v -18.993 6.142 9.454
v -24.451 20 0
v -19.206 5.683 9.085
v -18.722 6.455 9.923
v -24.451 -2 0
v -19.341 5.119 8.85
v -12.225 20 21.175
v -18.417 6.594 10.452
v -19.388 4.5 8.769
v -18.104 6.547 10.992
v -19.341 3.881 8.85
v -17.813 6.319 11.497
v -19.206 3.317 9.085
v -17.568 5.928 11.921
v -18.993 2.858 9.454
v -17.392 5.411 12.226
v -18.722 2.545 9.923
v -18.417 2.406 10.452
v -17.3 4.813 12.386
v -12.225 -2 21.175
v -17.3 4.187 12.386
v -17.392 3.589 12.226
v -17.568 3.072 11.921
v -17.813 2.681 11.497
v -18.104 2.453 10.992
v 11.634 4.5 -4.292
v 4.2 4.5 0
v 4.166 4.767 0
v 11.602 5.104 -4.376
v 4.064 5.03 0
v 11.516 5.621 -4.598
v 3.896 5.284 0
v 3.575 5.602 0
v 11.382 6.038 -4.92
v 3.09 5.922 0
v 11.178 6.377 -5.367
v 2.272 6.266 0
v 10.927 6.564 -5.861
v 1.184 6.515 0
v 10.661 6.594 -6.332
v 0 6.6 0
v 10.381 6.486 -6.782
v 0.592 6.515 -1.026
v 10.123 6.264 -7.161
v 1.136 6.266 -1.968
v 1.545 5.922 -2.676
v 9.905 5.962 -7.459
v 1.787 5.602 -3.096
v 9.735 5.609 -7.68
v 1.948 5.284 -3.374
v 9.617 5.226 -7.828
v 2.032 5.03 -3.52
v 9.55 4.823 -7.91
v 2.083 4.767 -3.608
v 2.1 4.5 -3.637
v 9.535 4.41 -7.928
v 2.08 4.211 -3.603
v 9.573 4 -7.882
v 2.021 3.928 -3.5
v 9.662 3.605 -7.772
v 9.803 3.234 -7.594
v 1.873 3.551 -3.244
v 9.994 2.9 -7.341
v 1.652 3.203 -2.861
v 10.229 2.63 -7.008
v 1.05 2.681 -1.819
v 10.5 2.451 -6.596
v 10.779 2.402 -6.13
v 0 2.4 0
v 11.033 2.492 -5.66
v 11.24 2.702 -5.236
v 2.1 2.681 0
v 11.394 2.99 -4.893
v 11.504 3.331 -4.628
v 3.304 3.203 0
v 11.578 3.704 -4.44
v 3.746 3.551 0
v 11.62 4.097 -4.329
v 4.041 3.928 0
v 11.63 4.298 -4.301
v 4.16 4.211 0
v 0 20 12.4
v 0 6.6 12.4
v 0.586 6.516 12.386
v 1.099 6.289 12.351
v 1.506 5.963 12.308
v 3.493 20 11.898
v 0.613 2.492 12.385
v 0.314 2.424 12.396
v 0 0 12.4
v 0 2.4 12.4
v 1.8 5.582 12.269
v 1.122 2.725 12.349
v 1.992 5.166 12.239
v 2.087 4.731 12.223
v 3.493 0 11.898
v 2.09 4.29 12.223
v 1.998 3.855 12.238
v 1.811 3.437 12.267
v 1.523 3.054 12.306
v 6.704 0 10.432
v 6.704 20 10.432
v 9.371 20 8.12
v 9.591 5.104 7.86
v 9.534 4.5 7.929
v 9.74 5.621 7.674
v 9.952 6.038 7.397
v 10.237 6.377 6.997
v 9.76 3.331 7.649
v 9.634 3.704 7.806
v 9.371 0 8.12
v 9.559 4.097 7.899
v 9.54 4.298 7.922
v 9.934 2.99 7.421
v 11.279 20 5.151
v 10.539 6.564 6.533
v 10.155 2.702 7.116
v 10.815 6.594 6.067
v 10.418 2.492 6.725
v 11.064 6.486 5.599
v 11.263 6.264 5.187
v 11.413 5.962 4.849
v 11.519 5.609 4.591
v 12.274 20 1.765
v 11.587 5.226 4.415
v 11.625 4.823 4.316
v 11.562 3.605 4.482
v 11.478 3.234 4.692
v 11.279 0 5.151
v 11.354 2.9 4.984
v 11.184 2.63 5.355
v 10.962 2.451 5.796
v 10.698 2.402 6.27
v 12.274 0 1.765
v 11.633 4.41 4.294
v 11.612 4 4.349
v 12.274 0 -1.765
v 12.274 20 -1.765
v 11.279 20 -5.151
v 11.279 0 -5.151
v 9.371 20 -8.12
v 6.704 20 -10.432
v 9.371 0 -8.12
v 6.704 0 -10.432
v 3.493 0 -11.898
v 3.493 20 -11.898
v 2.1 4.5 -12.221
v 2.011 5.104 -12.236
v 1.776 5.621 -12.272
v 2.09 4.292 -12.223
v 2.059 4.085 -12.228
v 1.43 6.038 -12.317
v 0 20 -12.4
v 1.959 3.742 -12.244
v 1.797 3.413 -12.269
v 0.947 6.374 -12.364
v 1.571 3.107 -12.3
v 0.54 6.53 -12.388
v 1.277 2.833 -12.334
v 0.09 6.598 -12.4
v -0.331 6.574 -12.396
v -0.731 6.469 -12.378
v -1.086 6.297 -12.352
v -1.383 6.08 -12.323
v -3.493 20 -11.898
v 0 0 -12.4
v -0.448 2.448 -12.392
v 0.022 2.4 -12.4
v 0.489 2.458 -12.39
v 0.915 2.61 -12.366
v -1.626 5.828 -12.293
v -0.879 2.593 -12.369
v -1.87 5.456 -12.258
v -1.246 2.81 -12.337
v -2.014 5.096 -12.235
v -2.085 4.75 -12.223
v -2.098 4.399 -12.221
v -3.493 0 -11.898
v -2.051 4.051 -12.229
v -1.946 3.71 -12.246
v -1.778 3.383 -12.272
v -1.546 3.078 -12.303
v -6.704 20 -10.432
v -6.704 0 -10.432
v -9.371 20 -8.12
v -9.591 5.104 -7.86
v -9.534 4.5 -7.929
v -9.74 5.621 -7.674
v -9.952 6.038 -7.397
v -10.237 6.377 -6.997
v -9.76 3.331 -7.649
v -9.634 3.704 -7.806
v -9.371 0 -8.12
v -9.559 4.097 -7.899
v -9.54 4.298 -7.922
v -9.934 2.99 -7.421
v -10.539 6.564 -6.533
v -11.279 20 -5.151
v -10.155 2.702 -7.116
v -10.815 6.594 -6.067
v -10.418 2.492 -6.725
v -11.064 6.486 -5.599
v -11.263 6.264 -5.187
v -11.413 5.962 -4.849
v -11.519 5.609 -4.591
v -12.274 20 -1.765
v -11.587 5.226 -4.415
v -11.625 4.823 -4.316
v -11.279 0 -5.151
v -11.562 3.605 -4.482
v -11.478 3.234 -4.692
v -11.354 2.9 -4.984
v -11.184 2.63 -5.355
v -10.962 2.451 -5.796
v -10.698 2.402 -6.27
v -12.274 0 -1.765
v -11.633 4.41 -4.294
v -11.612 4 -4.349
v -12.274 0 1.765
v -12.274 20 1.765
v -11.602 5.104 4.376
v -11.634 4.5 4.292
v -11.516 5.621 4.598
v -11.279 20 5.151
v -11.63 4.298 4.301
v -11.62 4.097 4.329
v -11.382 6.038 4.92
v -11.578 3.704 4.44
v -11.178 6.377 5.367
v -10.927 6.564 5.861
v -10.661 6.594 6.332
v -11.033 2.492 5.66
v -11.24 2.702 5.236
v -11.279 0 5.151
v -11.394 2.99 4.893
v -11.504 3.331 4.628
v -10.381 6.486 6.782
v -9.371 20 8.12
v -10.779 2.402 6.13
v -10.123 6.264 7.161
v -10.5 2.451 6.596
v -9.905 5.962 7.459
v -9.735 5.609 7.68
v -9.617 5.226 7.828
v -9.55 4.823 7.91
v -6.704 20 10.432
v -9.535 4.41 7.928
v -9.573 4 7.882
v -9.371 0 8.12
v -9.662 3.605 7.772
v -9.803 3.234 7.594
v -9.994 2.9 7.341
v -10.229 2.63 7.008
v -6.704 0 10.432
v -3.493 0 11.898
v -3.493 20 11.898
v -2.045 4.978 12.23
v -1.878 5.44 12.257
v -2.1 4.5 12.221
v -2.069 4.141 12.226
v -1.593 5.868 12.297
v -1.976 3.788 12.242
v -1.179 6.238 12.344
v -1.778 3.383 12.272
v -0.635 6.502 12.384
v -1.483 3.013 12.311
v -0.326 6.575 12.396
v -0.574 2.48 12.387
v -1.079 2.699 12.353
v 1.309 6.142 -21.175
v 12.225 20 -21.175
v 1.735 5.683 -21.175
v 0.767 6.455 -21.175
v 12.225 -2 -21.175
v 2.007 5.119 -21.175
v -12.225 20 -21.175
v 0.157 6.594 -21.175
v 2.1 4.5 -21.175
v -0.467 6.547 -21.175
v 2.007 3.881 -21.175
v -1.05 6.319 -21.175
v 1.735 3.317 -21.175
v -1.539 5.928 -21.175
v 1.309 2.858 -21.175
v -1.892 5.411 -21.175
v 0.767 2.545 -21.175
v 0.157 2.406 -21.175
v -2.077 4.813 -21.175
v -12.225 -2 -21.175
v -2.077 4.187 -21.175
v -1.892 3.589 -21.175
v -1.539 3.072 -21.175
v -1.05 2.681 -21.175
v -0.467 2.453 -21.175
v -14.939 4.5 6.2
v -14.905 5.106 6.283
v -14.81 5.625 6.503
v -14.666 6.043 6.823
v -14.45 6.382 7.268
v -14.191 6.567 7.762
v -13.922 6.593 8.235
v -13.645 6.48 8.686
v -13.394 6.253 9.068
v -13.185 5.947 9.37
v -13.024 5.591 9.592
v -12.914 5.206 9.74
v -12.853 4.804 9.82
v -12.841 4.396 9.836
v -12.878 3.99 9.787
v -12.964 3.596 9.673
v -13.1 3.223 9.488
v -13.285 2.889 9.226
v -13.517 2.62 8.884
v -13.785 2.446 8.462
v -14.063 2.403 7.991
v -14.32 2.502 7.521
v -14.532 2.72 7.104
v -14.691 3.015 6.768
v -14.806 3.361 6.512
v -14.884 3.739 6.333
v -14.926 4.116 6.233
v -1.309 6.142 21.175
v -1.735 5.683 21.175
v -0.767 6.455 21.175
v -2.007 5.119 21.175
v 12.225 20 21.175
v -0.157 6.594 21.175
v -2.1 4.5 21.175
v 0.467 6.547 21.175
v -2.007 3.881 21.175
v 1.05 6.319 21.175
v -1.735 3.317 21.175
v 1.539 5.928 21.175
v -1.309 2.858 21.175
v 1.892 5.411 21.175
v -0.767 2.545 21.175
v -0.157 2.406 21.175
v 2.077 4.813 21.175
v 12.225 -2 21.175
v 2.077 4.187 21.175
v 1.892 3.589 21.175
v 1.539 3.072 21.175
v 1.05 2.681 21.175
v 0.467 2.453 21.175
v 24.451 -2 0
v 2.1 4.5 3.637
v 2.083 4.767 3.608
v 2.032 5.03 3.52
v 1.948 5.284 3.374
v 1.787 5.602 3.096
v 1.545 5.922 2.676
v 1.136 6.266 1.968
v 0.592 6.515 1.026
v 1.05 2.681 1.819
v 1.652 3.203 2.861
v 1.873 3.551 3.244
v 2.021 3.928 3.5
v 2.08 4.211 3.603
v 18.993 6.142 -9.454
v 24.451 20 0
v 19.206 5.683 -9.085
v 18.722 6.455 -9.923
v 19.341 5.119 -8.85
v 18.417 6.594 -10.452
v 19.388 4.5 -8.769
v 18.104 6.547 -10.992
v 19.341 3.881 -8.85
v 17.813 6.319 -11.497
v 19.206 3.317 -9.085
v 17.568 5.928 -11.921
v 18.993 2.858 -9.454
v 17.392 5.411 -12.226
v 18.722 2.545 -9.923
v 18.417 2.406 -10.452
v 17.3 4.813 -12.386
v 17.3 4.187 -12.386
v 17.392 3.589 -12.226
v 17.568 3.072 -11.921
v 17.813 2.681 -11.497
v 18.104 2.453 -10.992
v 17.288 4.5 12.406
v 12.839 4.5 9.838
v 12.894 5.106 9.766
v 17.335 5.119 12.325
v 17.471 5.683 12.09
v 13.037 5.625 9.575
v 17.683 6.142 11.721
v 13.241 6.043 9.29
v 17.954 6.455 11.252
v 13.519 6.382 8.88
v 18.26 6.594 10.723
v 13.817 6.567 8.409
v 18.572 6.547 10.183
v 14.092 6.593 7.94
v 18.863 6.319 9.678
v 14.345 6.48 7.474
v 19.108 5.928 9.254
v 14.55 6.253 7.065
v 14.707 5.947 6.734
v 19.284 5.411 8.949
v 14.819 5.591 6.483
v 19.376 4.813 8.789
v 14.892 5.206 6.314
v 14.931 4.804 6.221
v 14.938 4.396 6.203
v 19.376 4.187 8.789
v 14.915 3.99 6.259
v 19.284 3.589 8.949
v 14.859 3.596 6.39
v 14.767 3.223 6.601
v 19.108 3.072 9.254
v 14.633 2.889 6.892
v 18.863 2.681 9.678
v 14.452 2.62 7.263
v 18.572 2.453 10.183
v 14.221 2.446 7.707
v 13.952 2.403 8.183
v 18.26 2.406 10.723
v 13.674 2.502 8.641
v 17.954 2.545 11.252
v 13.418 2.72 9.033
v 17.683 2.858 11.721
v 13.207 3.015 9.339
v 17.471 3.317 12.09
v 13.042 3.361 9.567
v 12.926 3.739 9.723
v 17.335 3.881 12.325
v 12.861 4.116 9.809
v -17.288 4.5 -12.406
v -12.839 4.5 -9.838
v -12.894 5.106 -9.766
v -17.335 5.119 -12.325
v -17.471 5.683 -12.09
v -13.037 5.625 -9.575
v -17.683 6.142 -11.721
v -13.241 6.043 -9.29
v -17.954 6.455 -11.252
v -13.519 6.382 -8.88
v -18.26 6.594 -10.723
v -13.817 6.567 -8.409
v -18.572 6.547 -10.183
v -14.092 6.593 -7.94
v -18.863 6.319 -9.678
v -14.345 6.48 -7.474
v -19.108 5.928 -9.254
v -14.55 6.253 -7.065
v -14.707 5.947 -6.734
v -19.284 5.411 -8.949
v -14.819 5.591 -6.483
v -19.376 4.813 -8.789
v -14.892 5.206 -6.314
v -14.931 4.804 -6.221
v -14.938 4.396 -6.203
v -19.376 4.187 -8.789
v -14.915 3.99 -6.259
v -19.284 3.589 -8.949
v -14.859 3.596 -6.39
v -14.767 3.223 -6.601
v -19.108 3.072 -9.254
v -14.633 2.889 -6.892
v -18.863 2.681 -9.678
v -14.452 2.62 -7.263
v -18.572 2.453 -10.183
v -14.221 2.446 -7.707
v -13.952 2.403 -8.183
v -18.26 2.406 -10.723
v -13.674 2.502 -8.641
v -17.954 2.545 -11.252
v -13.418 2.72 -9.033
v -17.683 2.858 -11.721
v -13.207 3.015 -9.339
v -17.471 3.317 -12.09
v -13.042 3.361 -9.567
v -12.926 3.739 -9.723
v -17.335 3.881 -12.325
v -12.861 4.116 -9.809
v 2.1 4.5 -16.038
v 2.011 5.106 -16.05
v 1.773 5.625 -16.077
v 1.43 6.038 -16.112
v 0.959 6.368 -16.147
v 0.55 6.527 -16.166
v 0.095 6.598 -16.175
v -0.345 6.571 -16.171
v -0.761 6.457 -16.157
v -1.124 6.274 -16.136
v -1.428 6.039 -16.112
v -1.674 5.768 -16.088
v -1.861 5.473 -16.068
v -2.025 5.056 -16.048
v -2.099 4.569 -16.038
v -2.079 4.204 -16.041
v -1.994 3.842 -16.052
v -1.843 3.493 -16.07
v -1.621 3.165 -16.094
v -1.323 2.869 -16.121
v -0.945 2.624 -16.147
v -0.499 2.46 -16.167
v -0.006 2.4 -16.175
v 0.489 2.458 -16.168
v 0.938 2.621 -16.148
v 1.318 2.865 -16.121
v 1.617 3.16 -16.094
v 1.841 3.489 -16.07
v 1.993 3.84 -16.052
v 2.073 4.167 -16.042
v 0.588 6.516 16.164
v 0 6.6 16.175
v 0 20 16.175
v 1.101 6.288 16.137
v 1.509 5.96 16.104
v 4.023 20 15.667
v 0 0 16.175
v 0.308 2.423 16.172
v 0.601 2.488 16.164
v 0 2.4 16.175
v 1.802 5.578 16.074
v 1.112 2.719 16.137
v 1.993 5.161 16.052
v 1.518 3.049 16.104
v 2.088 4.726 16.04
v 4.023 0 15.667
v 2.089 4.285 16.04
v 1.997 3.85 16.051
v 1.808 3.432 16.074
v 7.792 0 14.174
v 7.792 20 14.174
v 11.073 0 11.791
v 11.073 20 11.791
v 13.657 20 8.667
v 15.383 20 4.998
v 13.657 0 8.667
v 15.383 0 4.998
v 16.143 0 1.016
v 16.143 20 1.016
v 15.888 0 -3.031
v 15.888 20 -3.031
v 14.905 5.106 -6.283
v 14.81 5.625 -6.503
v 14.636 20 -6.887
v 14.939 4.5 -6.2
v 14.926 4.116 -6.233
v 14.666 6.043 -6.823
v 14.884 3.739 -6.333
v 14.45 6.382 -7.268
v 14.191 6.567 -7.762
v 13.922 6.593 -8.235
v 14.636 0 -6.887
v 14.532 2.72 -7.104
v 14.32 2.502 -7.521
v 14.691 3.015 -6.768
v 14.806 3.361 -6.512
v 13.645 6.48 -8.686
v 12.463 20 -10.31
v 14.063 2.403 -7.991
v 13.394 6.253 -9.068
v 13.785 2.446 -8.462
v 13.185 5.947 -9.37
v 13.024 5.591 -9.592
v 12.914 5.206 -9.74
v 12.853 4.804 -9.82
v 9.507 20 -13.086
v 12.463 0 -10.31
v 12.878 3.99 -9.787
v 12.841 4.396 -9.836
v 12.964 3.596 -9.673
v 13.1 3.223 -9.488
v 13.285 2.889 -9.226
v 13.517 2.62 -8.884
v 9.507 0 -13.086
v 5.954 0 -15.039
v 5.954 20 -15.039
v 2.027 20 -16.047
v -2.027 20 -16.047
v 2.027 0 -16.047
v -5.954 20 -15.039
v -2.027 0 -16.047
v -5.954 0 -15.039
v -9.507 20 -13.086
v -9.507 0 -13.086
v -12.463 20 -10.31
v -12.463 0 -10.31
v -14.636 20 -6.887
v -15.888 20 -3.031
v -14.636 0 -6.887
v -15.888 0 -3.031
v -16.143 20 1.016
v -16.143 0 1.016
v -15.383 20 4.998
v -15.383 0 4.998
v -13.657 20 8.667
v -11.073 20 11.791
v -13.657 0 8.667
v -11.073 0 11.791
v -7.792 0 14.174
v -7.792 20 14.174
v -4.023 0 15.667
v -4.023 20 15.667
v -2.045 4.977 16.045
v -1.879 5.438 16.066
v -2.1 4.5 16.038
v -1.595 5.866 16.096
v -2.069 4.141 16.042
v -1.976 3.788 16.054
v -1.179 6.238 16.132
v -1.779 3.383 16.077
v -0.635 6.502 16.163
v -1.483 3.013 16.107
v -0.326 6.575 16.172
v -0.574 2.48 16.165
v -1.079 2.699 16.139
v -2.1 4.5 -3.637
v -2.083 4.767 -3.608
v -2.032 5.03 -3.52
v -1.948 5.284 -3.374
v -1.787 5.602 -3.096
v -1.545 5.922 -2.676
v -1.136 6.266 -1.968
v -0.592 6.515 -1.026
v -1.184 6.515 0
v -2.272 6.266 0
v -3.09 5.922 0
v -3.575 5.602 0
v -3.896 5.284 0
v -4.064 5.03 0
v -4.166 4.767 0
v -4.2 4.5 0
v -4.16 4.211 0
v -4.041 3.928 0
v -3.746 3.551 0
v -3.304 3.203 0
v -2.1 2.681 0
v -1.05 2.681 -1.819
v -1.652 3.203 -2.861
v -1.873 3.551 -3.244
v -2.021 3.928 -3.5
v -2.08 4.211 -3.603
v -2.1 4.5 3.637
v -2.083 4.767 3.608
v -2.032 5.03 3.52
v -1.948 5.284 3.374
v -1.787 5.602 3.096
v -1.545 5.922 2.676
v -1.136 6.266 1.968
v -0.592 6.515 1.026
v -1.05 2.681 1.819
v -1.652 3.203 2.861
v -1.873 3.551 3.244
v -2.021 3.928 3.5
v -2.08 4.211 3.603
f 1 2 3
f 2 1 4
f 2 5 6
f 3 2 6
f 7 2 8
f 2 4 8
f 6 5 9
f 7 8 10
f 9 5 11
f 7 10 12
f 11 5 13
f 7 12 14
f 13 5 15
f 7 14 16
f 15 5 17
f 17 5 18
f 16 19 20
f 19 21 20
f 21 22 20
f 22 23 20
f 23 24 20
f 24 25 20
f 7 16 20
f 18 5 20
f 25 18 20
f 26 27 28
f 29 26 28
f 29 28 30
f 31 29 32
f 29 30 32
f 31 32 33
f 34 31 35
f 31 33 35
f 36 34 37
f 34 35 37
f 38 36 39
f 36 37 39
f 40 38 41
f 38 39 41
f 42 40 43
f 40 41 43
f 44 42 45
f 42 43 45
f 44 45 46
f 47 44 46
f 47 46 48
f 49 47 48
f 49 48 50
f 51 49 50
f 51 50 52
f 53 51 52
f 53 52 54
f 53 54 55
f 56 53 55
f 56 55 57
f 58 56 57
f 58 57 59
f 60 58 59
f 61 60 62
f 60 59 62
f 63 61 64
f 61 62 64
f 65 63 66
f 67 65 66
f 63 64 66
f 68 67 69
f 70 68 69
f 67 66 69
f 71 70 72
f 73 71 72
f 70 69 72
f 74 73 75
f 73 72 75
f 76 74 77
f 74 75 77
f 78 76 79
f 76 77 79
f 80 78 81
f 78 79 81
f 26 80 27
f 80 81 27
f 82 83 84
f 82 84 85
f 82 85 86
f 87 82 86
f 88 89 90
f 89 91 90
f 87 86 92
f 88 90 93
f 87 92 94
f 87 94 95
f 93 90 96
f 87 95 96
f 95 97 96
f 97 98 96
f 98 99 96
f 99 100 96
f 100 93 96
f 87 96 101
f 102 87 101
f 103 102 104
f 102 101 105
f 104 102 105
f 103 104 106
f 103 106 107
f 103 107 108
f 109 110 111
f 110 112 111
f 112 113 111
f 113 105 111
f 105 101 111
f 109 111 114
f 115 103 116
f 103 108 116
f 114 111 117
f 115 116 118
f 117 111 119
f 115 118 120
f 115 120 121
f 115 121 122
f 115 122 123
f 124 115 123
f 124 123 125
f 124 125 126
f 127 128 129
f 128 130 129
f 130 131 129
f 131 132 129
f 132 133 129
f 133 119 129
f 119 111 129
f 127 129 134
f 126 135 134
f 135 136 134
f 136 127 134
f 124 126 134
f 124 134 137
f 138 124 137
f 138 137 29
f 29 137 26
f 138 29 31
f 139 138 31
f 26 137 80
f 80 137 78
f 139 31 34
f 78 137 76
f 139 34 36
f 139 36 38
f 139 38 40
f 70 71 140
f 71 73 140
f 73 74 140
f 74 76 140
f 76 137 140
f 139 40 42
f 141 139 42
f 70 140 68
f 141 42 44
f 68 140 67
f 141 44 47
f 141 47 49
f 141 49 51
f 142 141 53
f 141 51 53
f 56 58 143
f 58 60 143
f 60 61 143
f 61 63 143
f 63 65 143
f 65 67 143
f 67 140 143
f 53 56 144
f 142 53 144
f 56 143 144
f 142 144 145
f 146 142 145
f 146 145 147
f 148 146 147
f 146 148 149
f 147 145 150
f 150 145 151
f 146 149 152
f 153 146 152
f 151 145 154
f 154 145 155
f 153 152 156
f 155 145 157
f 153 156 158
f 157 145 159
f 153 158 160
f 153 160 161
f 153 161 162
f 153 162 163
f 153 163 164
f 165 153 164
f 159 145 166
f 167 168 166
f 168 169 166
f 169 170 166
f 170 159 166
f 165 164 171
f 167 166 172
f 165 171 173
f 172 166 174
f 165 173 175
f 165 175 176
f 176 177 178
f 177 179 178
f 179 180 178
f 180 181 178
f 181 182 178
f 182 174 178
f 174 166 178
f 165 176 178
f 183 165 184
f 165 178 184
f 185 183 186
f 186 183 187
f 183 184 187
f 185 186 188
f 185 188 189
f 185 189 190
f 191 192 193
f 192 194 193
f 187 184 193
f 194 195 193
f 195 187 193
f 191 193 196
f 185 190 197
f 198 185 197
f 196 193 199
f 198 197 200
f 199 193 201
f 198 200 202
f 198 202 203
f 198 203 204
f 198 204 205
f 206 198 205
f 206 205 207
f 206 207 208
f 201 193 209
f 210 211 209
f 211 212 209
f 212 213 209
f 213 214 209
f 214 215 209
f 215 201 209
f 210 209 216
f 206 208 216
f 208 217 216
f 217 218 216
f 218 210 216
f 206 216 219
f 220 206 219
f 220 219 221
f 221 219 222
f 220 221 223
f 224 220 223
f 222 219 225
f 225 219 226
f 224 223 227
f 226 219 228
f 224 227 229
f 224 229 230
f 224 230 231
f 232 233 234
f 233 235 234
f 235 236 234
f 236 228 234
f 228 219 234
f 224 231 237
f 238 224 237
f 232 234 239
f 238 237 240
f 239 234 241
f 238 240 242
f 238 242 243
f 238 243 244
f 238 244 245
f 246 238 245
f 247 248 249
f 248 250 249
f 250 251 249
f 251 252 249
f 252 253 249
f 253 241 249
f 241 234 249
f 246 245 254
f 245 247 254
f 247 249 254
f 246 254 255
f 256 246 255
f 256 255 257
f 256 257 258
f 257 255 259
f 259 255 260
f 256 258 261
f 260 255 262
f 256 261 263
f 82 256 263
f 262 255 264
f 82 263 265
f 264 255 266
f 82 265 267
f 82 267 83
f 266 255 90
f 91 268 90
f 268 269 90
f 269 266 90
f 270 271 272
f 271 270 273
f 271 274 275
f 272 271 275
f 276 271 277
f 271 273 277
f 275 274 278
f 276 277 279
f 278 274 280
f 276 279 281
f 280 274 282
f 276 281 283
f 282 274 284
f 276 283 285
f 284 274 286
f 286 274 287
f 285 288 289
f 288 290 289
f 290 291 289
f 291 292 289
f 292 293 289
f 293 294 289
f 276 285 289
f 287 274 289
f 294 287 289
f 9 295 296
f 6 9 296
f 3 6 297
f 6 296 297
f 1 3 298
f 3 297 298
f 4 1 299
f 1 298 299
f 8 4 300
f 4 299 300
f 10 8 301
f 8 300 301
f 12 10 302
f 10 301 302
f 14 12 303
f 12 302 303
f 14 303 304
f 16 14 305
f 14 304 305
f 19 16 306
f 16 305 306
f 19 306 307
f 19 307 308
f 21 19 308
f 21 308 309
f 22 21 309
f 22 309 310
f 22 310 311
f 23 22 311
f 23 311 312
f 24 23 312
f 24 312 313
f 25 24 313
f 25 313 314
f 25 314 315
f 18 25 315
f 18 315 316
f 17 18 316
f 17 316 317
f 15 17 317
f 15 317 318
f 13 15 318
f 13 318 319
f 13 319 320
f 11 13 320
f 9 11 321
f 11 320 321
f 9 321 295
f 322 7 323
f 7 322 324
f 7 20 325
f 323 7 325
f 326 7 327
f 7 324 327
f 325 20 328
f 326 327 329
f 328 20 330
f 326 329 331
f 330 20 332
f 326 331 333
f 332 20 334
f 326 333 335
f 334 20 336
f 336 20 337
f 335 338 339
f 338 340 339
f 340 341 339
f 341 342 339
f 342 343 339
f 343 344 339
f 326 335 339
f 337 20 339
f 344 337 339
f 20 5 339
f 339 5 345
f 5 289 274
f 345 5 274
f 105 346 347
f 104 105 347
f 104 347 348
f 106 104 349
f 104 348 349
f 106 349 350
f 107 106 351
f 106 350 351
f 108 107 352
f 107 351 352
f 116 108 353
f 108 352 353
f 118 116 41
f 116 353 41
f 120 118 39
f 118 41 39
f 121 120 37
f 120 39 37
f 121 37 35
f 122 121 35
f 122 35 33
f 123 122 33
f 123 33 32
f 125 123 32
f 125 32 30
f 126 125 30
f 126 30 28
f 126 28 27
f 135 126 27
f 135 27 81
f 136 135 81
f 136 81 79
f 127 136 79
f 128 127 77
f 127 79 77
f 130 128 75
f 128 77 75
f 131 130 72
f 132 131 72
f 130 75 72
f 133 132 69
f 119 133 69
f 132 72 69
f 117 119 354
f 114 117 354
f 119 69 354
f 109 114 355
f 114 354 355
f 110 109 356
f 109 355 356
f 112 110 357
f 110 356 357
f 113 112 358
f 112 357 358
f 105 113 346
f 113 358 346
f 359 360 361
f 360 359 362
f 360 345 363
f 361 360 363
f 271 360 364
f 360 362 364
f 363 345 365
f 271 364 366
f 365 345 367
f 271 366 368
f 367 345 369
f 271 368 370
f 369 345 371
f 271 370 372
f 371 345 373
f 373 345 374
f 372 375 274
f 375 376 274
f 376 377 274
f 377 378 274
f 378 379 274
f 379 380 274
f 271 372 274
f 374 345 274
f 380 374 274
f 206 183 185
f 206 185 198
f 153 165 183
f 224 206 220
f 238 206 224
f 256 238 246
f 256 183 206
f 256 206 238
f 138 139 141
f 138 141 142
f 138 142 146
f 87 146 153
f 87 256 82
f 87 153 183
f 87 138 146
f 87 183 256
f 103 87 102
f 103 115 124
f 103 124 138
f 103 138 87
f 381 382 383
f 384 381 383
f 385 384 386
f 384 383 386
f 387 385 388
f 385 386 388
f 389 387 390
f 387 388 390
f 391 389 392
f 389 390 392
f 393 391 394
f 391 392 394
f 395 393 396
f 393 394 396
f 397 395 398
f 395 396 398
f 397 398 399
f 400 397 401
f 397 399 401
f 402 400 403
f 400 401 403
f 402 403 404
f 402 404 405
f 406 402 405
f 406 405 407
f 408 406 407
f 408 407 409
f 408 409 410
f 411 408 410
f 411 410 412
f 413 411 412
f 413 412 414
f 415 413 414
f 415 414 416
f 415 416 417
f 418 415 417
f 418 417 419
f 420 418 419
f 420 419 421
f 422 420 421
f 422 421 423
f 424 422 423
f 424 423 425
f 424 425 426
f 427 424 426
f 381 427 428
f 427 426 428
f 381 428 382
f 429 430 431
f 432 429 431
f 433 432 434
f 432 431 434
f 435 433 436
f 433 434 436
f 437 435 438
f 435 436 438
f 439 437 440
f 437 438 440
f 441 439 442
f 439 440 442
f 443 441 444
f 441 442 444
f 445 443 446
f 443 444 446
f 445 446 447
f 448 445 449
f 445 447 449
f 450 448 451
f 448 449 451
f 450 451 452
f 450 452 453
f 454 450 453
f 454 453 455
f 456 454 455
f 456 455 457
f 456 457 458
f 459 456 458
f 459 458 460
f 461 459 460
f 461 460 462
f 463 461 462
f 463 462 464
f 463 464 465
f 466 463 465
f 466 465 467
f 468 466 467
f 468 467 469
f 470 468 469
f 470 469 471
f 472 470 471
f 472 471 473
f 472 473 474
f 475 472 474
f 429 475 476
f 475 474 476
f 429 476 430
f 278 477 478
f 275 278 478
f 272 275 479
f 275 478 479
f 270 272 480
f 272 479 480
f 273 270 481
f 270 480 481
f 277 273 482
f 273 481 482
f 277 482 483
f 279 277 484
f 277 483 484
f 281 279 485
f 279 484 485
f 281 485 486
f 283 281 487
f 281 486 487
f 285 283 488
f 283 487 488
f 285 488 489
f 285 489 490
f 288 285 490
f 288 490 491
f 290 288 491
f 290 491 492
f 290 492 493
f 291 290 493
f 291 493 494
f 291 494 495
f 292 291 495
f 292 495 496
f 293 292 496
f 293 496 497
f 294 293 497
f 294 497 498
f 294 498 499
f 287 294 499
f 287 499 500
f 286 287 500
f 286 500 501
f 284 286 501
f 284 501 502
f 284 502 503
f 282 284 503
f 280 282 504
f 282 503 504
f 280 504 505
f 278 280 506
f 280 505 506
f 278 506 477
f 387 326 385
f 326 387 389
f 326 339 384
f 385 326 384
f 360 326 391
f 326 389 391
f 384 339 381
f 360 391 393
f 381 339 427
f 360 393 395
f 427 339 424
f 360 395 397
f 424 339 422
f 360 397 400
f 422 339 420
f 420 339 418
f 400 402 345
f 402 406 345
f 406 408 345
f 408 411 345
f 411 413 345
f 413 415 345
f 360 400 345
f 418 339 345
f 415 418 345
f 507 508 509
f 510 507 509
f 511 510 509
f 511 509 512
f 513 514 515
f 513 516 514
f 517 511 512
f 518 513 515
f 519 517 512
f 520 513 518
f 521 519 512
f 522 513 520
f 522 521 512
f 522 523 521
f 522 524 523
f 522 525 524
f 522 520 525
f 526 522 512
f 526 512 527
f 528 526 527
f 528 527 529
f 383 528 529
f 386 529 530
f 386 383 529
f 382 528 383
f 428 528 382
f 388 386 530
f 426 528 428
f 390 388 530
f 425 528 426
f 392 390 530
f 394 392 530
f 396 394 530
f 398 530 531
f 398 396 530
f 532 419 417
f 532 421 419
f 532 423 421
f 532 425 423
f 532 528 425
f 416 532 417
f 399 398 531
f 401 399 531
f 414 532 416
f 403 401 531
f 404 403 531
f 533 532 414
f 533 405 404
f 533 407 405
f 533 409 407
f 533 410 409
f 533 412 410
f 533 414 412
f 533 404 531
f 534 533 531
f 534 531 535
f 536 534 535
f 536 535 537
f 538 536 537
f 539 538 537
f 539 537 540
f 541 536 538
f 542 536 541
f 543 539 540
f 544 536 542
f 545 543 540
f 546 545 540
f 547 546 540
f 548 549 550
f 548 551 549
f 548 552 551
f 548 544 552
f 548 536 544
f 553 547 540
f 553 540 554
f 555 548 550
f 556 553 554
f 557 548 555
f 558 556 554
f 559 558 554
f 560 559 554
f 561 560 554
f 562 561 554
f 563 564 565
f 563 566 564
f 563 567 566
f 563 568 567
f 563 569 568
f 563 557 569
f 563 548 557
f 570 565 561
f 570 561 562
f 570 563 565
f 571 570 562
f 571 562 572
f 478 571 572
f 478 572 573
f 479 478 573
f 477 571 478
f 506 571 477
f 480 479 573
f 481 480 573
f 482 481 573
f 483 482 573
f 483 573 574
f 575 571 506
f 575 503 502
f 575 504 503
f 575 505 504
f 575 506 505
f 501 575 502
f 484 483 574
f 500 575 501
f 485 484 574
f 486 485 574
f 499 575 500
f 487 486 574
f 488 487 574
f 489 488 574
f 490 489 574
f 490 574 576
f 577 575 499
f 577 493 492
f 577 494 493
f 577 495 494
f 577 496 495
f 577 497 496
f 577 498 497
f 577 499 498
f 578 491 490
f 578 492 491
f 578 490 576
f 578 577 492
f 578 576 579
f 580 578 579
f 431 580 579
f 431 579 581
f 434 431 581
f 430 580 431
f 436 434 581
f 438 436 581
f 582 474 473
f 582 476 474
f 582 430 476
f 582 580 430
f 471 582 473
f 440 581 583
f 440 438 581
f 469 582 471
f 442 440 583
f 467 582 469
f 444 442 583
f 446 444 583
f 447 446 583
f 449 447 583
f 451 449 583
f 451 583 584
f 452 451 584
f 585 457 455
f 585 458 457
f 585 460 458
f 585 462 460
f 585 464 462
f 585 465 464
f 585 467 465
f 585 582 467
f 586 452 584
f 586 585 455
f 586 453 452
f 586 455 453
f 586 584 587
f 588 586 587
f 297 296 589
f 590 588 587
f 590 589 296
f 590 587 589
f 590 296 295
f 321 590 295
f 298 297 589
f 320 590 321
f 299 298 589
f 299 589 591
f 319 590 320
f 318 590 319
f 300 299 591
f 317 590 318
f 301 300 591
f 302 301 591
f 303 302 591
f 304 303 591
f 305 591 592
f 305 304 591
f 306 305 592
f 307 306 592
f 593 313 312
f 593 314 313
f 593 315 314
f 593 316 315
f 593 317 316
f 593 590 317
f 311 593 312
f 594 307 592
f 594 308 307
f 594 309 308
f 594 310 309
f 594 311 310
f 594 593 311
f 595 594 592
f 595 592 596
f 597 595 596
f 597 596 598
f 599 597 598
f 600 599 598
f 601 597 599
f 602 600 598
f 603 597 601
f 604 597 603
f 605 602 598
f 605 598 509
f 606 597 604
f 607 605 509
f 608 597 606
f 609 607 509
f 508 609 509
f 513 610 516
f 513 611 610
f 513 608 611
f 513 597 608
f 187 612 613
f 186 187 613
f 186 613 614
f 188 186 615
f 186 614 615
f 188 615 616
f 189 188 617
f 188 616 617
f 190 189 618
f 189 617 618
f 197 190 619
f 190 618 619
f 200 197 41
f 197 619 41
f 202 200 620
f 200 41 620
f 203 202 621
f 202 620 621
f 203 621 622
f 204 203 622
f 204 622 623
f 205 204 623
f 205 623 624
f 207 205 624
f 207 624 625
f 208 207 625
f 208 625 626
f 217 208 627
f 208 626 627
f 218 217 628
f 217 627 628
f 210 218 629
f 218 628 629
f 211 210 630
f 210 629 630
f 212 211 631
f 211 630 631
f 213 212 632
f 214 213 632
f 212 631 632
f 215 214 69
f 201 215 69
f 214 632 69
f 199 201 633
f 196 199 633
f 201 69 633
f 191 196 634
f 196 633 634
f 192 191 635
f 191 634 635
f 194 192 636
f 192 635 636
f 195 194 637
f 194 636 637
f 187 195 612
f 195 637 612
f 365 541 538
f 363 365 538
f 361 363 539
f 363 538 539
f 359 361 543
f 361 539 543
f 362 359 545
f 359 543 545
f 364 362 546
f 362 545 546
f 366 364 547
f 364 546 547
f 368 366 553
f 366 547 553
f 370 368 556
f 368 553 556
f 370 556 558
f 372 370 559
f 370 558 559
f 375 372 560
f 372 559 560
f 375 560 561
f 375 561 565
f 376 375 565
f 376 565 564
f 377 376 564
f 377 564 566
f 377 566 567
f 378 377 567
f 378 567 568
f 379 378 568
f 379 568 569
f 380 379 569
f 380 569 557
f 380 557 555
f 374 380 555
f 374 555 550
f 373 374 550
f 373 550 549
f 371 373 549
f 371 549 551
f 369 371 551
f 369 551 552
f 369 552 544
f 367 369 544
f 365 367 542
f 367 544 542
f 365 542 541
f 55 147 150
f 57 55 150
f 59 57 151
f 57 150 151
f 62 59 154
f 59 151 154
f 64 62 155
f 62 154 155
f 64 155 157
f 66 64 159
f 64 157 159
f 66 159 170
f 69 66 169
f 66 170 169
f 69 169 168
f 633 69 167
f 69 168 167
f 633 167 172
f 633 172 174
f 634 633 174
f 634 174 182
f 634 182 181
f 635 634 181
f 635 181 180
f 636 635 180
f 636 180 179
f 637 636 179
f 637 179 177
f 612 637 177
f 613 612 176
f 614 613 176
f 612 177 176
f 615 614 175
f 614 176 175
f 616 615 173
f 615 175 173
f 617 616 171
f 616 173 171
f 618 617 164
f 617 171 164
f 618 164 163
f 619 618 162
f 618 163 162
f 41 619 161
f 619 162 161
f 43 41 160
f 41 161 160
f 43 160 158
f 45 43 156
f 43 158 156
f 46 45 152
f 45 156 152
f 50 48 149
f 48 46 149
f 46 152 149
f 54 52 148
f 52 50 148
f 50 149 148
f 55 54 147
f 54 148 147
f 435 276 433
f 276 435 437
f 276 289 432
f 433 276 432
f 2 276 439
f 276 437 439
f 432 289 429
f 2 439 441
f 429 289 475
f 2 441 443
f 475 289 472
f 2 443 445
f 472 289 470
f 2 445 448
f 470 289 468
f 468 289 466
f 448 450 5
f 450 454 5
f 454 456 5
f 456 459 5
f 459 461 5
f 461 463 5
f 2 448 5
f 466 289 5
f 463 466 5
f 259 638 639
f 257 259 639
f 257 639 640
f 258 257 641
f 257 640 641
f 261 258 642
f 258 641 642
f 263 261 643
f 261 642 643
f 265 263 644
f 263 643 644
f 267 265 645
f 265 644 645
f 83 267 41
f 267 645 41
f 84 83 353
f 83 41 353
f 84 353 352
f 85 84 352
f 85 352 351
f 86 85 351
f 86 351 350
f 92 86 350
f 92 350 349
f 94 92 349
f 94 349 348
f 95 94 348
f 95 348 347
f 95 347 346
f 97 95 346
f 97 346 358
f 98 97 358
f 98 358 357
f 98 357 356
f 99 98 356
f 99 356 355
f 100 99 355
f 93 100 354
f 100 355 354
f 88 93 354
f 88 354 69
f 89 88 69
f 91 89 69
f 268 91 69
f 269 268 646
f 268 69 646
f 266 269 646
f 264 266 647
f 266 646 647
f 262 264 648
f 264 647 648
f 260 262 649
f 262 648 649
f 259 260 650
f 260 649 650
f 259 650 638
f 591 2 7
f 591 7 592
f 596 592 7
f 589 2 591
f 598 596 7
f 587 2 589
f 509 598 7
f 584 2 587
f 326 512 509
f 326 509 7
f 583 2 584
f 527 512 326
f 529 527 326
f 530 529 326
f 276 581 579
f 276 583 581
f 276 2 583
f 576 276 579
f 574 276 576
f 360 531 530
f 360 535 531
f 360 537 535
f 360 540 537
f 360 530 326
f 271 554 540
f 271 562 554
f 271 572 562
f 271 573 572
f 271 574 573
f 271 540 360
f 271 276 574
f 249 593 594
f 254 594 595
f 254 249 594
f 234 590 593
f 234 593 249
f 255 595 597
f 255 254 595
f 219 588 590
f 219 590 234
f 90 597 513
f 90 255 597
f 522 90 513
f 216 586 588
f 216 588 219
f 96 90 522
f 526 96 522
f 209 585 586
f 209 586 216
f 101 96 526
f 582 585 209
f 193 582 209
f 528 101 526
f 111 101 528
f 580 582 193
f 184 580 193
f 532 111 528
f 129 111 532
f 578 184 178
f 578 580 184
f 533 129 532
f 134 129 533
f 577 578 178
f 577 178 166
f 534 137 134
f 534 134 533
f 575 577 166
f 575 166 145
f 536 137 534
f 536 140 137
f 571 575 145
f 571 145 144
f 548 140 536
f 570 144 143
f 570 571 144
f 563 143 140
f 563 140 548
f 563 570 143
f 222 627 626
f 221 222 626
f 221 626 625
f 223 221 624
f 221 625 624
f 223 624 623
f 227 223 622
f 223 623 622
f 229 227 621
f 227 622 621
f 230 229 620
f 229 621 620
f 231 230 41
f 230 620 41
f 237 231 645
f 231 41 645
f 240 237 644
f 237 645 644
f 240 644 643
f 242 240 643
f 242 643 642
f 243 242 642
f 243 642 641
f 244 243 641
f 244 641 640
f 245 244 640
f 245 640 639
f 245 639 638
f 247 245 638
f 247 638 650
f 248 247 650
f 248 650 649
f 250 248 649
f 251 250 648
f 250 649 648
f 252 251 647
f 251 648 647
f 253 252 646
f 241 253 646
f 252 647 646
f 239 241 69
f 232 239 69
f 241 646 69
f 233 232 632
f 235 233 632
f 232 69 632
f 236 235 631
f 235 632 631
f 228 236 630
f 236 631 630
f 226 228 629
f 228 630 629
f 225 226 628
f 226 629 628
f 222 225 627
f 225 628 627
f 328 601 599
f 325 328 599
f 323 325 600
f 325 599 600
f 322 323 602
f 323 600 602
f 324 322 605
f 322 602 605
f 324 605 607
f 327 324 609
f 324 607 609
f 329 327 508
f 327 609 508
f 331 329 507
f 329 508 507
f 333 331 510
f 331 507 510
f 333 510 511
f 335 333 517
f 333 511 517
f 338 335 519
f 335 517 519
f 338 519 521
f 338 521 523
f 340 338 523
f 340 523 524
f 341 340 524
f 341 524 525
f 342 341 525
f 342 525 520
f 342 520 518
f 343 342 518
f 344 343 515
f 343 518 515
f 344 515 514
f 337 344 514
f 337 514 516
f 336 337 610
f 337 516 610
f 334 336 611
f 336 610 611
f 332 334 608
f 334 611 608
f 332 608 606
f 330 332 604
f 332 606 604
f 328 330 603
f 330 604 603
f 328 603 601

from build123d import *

# Parameters (mm, degrees)
BOSS_EXTRUDE1_DEPTH = 2
SKETCH1_3_R         = 16.175
SKETCH1_3_R_2       = 12.4
BOSS_EXTRUDE2_DEPTH = 20
SKETCH2_R           = 2.1
CUT_EXTRUDE1_DEPTH  = 39.029218482
CIRPATTERN1_COUNT   = 6


with BuildPart() as part:
    # Sketch1 → Boss-Extrude1 (new body)
    with BuildSketch(Plane(origin=(0, 0, 0), x_dir=(1, 0, 0), z_dir=(0, 1, 0))):
        Polygon((12.22539195, -21.175), (24.4507839, 0), (12.22539195, 21.175), (-12.22539195, 21.175), (-24.4507839, 0), (-12.22539195, -21.175), align=None)
    extrude(amount=-BOSS_EXTRUDE1_DEPTH)

    # Sketch1<3> → Boss-Extrude2 (add)
    # profile 1 of 2: a face of its own
    with BuildSketch(Plane(origin=(0, 0, 0), x_dir=(1, 0, 0), z_dir=(0, 1, 0))):
        Polygon((12.22539195, -21.175), (24.4507839, 0), (12.22539195, 21.175), (-12.22539195, 21.175), (-24.4507839, 0), (-12.22539195, -21.175), align=None)
        Circle(SKETCH1_3_R, mode=Mode.SUBTRACT)
    # profile 2 of 2: a face of its own
    with BuildSketch(Plane(origin=(0, 0, 0), x_dir=(1, 0, 0), z_dir=(0, 1, 0))):
        Circle(SKETCH1_3_R_2)
    extrude(amount=BOSS_EXTRUDE2_DEPTH)

    # Sketch2 → Cut-Extrude1 (cut, through all)
    with BuildSketch(Plane.XY):
        with Locations((0, 4.5)):
            Circle(SKETCH2_R)
    cut_extrude1 = extrude(amount=-CUT_EXTRUDE1_DEPTH, mode=Mode.SUBTRACT)

    # CirPattern1: Cut-Extrude1 ×6 about axis
    cirpattern1_axis = Axis((0, 20, 0), (0, -1, 0))
    for i in range(1, CIRPATTERN1_COUNT):
        add(cut_extrude1.rotate(cirpattern1_axis, i * 360 / CIRPATTERN1_COUNT), mode=Mode.SUBTRACT)


solid = part.part
